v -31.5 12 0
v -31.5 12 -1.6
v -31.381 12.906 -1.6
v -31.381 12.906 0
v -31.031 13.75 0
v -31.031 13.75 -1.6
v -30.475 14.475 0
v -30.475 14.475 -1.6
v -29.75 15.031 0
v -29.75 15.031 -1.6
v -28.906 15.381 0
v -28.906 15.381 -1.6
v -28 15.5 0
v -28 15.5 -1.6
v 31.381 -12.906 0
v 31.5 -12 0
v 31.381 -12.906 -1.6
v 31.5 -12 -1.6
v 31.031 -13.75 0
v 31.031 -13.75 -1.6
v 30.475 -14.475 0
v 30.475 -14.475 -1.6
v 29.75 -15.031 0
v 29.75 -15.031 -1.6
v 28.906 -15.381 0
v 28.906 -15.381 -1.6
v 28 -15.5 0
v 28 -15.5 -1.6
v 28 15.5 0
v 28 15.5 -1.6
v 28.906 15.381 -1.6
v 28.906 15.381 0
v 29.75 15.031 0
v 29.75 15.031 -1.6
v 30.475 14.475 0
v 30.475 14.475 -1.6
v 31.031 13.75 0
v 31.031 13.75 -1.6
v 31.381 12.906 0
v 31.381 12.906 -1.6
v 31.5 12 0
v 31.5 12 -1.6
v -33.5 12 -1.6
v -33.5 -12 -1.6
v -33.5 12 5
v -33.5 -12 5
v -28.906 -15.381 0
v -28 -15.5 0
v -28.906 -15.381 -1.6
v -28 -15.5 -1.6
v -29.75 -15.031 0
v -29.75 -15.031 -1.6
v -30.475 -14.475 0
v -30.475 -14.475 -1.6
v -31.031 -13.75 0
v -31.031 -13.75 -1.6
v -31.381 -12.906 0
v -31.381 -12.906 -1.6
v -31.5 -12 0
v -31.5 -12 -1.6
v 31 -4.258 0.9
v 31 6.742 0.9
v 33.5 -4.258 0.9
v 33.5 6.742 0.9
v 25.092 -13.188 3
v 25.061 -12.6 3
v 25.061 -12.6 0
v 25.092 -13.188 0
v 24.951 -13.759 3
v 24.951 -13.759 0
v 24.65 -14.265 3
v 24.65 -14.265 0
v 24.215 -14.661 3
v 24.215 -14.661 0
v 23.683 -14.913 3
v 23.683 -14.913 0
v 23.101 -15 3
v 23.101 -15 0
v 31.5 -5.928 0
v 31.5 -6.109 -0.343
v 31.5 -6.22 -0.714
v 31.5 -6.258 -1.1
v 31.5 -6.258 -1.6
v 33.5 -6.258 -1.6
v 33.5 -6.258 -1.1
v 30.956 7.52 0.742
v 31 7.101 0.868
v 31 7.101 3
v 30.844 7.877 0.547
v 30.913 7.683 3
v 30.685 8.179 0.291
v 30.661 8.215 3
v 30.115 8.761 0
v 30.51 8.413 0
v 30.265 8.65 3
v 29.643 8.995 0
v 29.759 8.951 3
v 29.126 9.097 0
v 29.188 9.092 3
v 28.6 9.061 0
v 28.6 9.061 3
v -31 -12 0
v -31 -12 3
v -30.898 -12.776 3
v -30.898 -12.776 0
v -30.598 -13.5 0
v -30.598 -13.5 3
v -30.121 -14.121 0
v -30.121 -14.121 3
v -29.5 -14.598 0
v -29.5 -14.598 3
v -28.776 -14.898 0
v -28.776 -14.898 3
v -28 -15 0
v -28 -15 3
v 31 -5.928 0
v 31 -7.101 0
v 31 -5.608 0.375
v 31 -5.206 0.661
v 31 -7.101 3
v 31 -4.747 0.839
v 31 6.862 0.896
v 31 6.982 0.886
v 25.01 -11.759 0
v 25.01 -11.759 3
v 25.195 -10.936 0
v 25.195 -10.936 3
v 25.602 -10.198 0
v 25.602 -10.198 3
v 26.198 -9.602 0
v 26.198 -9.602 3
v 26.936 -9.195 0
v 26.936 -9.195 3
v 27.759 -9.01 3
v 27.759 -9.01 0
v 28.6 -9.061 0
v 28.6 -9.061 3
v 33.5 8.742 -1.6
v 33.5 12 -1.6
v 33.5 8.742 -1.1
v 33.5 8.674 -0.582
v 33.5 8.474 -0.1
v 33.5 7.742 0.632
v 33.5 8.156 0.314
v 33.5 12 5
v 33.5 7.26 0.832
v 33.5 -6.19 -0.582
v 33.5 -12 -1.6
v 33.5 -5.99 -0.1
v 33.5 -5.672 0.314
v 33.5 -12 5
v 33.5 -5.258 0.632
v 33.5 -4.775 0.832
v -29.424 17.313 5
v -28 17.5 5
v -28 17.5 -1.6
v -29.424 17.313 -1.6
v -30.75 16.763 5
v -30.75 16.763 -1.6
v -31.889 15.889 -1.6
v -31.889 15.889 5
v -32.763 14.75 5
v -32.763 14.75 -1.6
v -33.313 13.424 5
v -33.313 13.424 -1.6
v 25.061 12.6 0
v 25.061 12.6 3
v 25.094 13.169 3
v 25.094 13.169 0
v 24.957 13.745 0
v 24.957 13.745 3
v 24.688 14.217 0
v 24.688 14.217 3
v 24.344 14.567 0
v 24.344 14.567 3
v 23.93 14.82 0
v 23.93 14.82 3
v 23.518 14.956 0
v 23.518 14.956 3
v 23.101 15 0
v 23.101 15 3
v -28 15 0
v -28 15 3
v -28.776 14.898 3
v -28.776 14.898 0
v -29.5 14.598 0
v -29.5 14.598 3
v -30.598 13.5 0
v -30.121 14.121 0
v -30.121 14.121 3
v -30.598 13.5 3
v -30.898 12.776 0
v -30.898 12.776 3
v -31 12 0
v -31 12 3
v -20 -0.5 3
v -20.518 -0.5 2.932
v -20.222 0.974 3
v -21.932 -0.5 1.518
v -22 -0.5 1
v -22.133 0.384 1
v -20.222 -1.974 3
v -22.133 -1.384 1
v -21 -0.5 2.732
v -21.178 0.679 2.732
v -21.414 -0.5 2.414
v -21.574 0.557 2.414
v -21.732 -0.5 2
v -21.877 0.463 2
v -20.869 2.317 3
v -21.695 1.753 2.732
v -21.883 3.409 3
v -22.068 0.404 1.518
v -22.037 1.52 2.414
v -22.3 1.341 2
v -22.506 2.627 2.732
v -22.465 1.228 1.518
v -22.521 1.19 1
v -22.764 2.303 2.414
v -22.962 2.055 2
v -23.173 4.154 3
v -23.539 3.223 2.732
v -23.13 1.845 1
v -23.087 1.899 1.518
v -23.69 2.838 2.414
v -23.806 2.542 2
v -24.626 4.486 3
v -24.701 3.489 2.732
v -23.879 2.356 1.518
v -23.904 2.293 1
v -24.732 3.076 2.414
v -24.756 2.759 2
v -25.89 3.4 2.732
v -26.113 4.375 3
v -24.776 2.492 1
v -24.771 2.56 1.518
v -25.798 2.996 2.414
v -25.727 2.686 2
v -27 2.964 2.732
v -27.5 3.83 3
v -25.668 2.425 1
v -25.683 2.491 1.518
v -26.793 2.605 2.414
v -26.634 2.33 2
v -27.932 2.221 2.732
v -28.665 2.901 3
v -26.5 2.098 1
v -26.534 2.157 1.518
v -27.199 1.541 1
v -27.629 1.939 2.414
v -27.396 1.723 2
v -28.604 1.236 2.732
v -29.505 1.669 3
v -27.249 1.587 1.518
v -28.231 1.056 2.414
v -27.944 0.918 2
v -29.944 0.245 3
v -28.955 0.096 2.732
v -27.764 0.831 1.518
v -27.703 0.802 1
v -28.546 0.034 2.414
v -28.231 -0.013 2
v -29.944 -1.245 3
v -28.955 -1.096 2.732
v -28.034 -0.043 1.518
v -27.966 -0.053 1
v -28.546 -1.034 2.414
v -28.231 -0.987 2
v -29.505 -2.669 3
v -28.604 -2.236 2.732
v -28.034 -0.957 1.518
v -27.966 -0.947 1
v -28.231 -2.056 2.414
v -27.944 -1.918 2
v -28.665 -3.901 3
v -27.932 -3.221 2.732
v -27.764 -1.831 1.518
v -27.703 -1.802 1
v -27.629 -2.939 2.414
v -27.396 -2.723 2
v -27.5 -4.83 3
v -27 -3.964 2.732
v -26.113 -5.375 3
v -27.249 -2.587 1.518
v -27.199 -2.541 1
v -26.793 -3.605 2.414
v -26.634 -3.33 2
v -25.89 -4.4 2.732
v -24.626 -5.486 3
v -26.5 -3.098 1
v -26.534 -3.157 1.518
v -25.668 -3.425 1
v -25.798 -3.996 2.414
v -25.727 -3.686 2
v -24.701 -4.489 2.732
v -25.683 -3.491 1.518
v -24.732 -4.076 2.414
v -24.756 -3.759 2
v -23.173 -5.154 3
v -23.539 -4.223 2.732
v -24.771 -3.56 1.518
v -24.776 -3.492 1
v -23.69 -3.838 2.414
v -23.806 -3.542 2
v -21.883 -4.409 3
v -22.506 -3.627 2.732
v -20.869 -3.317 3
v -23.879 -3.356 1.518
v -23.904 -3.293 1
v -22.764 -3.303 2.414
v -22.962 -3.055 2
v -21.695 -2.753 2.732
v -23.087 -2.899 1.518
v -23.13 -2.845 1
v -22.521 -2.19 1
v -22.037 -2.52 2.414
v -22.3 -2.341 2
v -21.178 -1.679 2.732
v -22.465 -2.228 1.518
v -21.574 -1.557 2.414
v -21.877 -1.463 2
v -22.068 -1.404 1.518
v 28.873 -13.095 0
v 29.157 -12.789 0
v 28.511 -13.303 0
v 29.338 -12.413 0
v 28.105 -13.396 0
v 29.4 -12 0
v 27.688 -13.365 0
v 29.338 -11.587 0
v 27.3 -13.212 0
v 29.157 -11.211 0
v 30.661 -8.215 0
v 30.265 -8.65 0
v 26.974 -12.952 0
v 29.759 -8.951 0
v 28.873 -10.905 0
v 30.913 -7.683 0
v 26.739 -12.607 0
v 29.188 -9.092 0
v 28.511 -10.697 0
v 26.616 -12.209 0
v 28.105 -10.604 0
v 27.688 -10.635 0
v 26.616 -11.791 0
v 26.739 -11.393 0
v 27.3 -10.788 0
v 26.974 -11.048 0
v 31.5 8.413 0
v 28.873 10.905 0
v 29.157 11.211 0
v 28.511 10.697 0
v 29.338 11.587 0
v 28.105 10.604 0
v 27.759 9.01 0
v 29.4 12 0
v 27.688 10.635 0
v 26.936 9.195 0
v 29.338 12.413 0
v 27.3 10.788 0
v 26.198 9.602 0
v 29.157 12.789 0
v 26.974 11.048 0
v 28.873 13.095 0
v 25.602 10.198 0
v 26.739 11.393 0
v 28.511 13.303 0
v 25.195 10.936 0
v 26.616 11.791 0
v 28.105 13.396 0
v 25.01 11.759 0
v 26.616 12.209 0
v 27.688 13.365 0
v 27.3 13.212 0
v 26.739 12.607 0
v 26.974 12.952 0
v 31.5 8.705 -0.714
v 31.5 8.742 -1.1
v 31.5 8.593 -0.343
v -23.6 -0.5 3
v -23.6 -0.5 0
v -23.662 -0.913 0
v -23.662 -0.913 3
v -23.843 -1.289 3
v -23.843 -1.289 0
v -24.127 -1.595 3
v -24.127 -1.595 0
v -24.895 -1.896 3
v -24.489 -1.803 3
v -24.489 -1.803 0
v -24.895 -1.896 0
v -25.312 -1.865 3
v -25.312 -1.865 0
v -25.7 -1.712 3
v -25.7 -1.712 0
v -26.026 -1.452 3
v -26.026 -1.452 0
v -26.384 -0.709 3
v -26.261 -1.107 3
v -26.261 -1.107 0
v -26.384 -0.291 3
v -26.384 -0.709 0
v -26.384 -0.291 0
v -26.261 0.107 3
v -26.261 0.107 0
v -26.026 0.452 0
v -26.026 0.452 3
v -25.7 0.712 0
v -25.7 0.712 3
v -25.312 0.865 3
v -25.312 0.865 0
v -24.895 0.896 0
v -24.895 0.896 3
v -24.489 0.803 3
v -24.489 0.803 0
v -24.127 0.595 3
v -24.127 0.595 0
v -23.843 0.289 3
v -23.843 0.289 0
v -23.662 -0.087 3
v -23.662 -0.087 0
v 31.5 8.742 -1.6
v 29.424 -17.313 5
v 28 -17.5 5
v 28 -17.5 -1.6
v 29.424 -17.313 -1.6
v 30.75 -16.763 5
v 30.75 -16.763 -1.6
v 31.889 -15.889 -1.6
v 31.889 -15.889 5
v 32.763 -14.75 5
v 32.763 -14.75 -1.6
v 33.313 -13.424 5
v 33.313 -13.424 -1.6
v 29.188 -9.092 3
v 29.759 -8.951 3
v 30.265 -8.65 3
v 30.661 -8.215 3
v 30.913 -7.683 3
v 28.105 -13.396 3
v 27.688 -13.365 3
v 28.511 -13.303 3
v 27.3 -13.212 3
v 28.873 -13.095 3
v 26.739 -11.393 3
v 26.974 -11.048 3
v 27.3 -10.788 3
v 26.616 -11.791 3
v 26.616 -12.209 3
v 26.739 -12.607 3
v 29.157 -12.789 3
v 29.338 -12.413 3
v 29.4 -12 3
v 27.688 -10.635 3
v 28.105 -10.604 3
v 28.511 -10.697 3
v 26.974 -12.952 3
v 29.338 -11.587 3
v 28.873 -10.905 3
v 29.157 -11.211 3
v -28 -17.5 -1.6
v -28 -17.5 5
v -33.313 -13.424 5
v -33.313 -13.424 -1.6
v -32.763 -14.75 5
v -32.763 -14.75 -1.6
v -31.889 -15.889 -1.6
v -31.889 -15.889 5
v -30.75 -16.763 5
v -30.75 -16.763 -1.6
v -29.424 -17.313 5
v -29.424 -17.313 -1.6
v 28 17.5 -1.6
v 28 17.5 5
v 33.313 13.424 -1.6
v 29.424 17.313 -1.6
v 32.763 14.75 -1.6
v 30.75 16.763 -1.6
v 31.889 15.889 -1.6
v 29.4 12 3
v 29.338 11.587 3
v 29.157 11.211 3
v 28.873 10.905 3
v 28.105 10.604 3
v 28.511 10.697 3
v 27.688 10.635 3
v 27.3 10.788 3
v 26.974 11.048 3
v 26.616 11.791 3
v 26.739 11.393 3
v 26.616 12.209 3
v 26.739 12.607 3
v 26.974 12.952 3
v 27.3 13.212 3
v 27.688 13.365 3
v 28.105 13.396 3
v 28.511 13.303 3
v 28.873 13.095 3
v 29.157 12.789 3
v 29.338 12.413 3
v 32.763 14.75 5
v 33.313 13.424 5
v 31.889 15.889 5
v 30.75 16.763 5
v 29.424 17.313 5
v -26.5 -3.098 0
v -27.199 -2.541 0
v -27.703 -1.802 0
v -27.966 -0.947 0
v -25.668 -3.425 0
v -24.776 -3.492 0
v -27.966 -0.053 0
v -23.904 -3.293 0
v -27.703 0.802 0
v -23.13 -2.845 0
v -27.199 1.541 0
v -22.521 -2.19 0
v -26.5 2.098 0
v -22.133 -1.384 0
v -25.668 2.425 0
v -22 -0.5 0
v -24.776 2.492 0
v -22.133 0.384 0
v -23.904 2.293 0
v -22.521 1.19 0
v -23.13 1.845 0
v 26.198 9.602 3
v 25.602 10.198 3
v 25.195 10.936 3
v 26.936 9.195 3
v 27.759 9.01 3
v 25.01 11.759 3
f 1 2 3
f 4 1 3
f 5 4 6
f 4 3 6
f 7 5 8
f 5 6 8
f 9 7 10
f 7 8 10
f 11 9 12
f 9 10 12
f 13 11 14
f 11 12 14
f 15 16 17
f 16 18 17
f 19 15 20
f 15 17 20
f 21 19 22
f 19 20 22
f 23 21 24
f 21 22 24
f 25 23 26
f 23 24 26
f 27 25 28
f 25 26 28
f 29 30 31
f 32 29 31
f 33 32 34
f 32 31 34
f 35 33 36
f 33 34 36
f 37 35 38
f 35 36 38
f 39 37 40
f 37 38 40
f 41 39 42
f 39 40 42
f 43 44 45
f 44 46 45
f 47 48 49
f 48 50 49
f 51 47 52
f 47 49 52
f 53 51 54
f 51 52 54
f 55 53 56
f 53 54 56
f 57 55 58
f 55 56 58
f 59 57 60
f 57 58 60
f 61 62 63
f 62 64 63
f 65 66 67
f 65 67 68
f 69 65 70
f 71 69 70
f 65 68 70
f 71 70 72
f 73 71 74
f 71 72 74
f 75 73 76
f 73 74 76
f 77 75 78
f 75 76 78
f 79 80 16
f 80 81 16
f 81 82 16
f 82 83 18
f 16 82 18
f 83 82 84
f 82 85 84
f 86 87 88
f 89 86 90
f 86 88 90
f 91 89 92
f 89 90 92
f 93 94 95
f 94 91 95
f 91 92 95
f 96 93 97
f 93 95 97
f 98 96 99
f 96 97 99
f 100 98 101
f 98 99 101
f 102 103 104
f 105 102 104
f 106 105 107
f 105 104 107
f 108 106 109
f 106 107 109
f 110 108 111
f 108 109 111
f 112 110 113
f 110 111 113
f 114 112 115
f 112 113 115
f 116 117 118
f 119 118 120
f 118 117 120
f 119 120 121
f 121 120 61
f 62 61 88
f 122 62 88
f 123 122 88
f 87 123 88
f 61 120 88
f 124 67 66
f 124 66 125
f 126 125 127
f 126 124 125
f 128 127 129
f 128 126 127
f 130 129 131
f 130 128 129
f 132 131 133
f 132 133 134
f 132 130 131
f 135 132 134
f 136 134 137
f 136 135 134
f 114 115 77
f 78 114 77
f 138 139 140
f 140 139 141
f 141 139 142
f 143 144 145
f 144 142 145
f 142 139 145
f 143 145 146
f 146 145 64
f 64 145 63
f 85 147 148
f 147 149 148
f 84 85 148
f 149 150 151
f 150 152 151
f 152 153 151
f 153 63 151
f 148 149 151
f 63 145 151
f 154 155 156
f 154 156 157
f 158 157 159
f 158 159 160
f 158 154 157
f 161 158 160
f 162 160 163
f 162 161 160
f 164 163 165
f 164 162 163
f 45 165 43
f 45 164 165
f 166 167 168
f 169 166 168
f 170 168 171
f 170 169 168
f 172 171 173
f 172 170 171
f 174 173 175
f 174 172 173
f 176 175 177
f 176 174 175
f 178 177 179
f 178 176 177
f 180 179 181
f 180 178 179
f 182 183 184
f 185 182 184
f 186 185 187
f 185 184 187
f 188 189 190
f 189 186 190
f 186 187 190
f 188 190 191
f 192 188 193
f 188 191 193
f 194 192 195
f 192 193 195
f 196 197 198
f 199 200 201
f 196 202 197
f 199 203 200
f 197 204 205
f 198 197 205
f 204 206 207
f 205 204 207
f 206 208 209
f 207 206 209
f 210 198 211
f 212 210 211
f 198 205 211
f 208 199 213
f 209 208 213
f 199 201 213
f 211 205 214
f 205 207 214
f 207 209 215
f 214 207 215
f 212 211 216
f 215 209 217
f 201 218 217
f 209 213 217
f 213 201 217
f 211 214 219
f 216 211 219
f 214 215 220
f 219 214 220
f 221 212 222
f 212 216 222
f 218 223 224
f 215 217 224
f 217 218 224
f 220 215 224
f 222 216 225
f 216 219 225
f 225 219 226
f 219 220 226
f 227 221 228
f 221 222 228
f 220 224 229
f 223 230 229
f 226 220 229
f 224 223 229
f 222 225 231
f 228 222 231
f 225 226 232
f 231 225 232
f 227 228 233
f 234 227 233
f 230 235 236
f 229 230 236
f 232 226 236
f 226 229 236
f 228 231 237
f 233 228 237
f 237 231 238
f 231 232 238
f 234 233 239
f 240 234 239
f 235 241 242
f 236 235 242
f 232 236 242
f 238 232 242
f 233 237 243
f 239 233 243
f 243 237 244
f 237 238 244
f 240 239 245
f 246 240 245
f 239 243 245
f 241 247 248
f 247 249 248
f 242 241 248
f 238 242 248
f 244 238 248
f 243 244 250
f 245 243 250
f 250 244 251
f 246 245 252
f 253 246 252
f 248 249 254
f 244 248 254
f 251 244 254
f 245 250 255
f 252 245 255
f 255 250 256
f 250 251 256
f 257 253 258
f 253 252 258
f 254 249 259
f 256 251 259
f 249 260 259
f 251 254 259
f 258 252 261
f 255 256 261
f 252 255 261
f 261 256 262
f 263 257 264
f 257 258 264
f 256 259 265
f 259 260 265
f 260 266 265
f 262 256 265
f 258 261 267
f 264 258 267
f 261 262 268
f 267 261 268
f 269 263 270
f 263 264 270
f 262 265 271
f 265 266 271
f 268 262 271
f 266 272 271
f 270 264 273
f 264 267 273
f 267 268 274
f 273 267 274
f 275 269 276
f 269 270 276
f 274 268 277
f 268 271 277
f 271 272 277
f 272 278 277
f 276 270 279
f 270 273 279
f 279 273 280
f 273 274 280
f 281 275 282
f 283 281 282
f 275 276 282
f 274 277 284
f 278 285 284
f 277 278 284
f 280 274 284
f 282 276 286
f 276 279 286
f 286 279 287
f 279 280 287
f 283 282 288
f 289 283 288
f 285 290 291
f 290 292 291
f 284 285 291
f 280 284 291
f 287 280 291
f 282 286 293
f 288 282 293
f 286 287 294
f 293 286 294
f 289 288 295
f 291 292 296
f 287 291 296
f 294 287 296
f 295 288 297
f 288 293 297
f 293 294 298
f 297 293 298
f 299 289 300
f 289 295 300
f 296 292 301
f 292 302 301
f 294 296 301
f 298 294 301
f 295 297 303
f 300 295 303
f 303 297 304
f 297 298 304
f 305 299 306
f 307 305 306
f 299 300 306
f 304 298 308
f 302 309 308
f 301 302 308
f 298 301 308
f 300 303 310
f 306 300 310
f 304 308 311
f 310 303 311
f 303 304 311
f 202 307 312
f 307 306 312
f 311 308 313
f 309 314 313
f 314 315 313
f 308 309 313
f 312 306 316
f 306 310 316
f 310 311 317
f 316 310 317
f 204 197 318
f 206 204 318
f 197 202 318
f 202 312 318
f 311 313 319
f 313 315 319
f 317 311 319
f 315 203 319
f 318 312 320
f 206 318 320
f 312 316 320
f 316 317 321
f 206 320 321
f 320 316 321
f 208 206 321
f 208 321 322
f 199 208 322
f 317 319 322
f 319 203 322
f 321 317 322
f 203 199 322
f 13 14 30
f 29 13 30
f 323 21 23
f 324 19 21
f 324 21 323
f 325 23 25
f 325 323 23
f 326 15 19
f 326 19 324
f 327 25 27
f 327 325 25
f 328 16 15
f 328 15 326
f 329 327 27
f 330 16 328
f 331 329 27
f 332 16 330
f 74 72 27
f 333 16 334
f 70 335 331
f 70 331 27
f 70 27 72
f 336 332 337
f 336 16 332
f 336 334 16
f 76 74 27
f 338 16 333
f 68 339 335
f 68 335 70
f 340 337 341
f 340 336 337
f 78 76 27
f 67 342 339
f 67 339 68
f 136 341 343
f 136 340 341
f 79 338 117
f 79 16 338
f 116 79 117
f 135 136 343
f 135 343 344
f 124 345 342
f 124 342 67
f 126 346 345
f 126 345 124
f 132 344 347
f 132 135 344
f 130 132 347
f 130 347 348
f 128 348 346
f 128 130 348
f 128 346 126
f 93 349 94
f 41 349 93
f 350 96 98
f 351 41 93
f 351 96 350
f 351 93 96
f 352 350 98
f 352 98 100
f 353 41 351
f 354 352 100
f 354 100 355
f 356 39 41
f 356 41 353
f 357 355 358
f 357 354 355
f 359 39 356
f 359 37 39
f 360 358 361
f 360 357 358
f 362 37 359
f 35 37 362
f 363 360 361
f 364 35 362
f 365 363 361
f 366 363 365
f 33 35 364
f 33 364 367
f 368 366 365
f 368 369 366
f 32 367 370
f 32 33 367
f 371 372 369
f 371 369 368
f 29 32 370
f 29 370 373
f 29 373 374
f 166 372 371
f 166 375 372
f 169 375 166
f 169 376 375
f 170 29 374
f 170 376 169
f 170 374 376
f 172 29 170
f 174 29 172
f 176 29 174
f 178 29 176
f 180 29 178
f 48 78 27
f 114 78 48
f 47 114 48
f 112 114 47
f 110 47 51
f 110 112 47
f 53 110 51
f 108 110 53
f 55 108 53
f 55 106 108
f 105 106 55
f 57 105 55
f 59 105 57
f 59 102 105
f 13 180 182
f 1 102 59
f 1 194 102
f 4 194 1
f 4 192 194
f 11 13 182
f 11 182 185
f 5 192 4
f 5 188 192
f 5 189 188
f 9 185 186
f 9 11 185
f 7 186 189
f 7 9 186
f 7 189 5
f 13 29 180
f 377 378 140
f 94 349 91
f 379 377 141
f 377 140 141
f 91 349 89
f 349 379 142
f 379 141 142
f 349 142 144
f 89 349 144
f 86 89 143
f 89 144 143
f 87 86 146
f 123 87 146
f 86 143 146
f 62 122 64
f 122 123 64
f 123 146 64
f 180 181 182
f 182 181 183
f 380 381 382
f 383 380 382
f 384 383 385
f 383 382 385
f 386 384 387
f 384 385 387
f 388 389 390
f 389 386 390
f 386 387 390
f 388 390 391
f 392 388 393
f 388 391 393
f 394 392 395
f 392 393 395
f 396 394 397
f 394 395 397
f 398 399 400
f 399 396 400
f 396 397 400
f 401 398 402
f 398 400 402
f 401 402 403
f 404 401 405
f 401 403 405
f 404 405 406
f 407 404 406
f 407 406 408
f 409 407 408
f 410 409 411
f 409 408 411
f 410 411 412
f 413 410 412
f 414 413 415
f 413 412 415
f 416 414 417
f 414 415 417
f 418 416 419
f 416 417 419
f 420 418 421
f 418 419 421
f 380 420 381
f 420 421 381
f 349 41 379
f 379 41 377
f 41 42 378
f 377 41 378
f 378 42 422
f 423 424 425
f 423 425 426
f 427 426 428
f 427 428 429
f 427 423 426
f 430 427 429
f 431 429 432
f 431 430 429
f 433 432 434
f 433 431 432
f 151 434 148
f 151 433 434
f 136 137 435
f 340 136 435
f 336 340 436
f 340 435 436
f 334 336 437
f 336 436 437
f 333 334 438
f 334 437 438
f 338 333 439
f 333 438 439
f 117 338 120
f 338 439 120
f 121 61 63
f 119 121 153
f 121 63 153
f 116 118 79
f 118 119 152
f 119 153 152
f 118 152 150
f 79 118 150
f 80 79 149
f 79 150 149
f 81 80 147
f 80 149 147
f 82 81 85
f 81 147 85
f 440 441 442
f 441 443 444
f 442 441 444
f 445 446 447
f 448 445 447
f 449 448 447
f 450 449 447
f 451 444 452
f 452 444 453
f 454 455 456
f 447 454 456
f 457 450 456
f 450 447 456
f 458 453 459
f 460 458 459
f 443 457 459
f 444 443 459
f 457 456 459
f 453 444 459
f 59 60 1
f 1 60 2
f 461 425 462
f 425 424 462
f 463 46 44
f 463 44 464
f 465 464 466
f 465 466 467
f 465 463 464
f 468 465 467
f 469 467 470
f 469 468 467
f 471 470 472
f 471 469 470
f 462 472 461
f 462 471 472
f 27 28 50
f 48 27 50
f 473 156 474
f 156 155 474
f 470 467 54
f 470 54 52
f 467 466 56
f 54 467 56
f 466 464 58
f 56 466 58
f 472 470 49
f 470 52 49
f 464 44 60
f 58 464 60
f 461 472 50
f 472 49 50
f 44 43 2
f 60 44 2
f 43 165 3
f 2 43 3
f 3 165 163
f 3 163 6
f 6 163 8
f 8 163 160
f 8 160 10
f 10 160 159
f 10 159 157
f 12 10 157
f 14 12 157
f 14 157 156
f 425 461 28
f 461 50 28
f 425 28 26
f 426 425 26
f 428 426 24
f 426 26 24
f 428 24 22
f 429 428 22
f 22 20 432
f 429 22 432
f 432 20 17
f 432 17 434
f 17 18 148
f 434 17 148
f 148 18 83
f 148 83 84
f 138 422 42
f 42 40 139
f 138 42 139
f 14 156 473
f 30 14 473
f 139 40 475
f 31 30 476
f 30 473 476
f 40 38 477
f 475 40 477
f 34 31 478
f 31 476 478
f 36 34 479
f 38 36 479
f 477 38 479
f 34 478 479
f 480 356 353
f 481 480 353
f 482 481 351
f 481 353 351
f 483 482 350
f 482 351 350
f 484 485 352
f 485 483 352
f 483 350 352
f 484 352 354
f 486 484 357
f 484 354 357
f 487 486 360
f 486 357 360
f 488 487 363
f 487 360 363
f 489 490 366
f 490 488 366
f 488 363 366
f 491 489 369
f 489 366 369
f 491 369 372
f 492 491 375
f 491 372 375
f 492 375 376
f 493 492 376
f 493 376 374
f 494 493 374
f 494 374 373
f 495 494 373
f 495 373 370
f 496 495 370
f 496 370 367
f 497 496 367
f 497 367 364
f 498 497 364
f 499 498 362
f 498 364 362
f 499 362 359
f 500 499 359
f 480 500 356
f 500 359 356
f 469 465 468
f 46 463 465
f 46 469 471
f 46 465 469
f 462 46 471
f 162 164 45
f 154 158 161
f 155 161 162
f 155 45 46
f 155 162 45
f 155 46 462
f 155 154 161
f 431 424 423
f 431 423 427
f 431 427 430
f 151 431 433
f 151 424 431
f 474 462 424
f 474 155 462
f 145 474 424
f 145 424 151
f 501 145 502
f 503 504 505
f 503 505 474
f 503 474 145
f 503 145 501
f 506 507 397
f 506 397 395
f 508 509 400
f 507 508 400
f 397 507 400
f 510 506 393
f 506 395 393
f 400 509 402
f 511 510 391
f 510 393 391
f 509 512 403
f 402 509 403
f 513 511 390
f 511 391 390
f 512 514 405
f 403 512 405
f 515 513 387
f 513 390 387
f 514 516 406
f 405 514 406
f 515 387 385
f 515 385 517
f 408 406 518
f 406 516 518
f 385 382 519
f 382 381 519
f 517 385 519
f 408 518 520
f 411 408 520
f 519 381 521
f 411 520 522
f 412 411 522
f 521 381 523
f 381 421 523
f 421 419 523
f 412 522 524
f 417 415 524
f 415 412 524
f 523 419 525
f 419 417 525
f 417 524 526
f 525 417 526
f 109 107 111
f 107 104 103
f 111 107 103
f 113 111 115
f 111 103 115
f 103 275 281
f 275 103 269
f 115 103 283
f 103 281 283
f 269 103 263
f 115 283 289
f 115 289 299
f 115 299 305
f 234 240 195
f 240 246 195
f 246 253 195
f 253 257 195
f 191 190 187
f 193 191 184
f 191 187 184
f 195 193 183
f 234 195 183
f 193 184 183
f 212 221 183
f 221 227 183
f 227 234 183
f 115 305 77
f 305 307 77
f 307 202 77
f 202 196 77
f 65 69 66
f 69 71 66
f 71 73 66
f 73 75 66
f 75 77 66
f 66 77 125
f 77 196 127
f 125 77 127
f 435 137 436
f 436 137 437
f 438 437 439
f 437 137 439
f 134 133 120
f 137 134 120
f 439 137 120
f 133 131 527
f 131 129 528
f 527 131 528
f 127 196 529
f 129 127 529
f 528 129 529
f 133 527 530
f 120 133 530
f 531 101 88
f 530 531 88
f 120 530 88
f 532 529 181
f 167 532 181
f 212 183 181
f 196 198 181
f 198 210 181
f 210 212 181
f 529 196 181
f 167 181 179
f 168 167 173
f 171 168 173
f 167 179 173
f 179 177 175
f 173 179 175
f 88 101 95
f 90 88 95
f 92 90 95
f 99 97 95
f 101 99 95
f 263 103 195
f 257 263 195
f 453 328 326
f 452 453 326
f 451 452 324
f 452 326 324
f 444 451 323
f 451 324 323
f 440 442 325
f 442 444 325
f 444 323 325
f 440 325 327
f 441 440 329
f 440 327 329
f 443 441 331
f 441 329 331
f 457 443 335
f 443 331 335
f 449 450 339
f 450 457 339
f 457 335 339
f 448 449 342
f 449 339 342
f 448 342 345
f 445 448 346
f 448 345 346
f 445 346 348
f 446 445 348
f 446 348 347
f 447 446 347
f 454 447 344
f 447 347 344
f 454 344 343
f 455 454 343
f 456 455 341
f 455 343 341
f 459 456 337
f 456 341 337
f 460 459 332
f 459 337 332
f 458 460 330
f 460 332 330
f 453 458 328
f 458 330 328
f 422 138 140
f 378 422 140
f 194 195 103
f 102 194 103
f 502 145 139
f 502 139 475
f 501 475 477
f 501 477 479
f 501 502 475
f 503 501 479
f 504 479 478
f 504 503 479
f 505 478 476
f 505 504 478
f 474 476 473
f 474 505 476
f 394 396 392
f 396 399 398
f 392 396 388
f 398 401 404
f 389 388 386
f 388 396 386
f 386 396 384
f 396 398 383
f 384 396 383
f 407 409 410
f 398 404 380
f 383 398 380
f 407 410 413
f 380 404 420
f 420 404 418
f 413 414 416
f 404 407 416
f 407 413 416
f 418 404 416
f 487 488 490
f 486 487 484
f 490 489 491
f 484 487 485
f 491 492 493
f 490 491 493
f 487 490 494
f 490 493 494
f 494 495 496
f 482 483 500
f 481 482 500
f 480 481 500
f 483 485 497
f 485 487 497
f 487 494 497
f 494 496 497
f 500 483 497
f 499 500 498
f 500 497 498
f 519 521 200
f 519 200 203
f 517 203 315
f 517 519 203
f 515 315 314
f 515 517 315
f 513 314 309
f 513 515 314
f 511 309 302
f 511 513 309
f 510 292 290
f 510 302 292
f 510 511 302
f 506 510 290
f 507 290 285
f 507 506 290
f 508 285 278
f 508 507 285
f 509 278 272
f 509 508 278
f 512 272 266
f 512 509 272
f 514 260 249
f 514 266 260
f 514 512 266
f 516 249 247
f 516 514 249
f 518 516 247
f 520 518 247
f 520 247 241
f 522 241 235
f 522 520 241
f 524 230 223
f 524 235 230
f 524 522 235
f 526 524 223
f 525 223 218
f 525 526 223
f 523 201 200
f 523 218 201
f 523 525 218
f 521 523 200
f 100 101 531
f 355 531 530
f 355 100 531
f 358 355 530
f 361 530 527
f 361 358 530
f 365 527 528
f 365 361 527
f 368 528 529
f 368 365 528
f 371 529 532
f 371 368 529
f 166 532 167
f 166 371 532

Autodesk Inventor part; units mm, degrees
ref_plane "YZ Plane" through (0, 0, 0) normal (1, 0, 0) x (0, 1, 0)
ref_plane "XZ Plane" through (0, 0, 0) normal (0, 1, 0) x (-1, 0, 0)
sketch "Sketch1" plane through (0, 0, 0) normal (0, 0, 1) x (1, 0, 0)
  circle A0 centre (28, -12) radius 1.6 construction
  circle A1 centre (-25, -0.5) radius 1.6 construction
  circle A2 centre (28, 12) radius 1.6 construction
  line L0 (-28, -15) -> (28, -15)
  line L1 (-31, 12) -> (-31, -12)
  line L2 (28, 15) -> (-28, 15)
  line L3 (31, -12) -> (31, 12)
  circle A3 centre (28, -12) radius 3
  circle A4 centre (28, 12) radius 3
  circle A5 centre (-25, -0.5) radius 3
  circle A6 centre (28, -12) radius 1.4
  circle A7 centre (28, 12) radius 1.4
  circle A8 centre (-25, -0.5) radius 1.4
  point P0 (0, 0)
extrude "Extrusion1" add sketch "Sketch1" along normal blind 3
sketch "Sketch2" plane through (28, -12, 3) normal (0, 0, 1) x (1, 0, 0)
  line L0 (-59, 24) -> (-59, 0) projected
  line L1 (0, 27) -> (-56, 27) projected
  line L2 (-56, -3) -> (0, -3) projected
  line L3 (3, 0) -> (3, 24) projected
  line L4 (-59, 27) -> (3, 27)
  line L5 (3, 27) -> (3, -3)
  line L6 (3, -3) -> (-59, -3)
  line L7 (-59, -3) -> (-59, 27)
  point P0 (-28, 12)
extrude "Extrusion2" add sketch "Sketch2" along normal blind 2
fillet "Fillet1" radius 3 4 edges at (31, -15, 4) (31, 15, 4) (-31, 15, 4) (-31, -15, 4)
sketch "Sketch3" plane through (28, -12, 5) normal (0, 0, 1) x (1, 0, 0)
  arc A0 (-59, 0) -> (-56, -3) centre (-56, 0) ccw projected
  line L0 (-56, -3) -> (0, -3) projected
  arc A1 (0, -3) -> (3, 0) centre (0, 0) ccw projected
  line L1 (3, 0) -> (3, 24) projected
  arc A2 (3, 24) -> (0, 27) centre (0, 24) ccw projected
  line L2 (0, 27) -> (-56, 27) projected
  arc A3 (-56, 27) -> (-59, 24) centre (-56, 24) ccw projected
  line L3 (-59, 24) -> (-59, 0) projected
  line L4 (5.5, 24) -> (5.5, 0)
  arc A4 (0, -5.5) -> (5.5, 0) centre (0, 0) ccw
  line L5 (0, -5.5) -> (-56, -5.5)
  arc A5 (-61.5, 0) -> (-56, -5.5) centre (-56, 0) ccw
  line L6 (-61.5, 0) -> (-61.5, 24)
  arc A6 (-56, 29.5) -> (-61.5, 24) centre (-56, 24) ccw
  line L7 (-56, 29.5) -> (0, 29.5)
  arc A7 (5.5, 24) -> (0, 29.5) centre (0, 24) ccw
  point P0 (-28, 12)
  dimension "d9" = 2.5
ref_plane "Work Plane1" through (-31, -15, -1.6) normal (0, 0, -1) x (0, 1, 0)
extrude "Extrusion3" add sketch "Sketch3" against normal up to surface (6.6 mm away)
sketch "Sketch4" plane through (28, 17.5, -1.6) normal (0, 0, -1) x (-1, 0, 0)
  arc A0 (59, -5.5) -> (56, -2.5) centre (56, -5.5) ccw projected
  line L0 (59, -29.5) -> (59, -5.5) projected
  arc A1 (56, -32.5) -> (59, -29.5) centre (56, -29.5) ccw projected
  line L1 (0, -32.5) -> (56, -32.5) projected
  arc A2 (-3, -29.5) -> (0, -32.5) centre (0, -29.5) ccw projected
  line L2 (-3, -5.5) -> (-3, -29.5) projected
  arc A3 (0, -2.5) -> (-3, -5.5) centre (0, -5.5) ccw projected
  line L3 (56, -2.5) -> (0, -2.5) projected
  arc A4 (56, -35) -> (61.5, -29.5) centre (56, -29.5) ccw projected
  line L4 (61.5, -5.5) -> (61.5, -29.5) projected
  arc A5 (61.5, -5.5) -> (56, 0) centre (56, -5.5) ccw projected
  line L5 (0, 0) -> (56, 0) projected
  arc A6 (0, 0) -> (-5.5, -5.5) centre (0, -5.5) ccw projected
  line L6 (-5.5, -29.5) -> (-5.5, -5.5) projected
  arc A7 (-5.5, -29.5) -> (0, -35) centre (0, -29.5) ccw projected
  line L7 (56, -35) -> (0, -35) projected
  arc A8 (0, -2) -> (-3.5, -5.5) centre (0, -5.5) ccw
  line L8 (-3.5, -5.5) -> (-3.5, -29.5)
  arc A9 (-3.5, -29.5) -> (0, -33) centre (0, -29.5) ccw
  line L9 (0, -33) -> (56, -33)
  arc A10 (56, -33) -> (59.5, -29.5) centre (56, -29.5) ccw
  line L10 (59.5, -29.5) -> (59.5, -5.5)
  arc A11 (59.5, -5.5) -> (56, -2) centre (56, -5.5) ccw
  line L11 (56, -2) -> (0, -2)
  point P0 (28, -17.5)
  dimension "d12" = 0.5
extrude "Extrusion4" cut sketch "Sketch4" against normal up to surface (1.6 mm away) contours L11 A11 L10 A10 L9 A9 L8 A8
sketch "Sketch5" plane through (33.5, -12, 5) normal (1, 0, 0) x (0, 0, -1)
  line L0 (6.6, 20.7422) -> (10.115, 20.7422) projected
  line L1 (10.115, 5.7422) -> (6.6, 5.7422) projected
  line L2 (6.6, 20.7422) -> (4.1, 20.7422)
  line L3 (4.1, 20.7422) -> (4.1, 5.7422)
  line L4 (4.1, 5.7422) -> (6.6, 5.7422)
  line L5 (6.6, 5.7422) -> (6.6, 20.7422)
  point P0 (5, 12)
  dimension "d15" = 2.5
extrude "Extrusion5" cut sketch "Sketch5" against normal blind 21.75
fillet "Fillet2" radius 2 2 edges at (32.25, 8.7422, 0.9) (32.25, -6.2578, 0.9)
fillet "Fillet3" radius 2 4 edges at (31, 12, 1.5) (28, 15, 1.5) (28, -15, 1.5) (31, -12, 1.5)
fillet "Fillet4" radius 2 1 edges at (-28, -0.5, 3)
properties part number "case_base"
